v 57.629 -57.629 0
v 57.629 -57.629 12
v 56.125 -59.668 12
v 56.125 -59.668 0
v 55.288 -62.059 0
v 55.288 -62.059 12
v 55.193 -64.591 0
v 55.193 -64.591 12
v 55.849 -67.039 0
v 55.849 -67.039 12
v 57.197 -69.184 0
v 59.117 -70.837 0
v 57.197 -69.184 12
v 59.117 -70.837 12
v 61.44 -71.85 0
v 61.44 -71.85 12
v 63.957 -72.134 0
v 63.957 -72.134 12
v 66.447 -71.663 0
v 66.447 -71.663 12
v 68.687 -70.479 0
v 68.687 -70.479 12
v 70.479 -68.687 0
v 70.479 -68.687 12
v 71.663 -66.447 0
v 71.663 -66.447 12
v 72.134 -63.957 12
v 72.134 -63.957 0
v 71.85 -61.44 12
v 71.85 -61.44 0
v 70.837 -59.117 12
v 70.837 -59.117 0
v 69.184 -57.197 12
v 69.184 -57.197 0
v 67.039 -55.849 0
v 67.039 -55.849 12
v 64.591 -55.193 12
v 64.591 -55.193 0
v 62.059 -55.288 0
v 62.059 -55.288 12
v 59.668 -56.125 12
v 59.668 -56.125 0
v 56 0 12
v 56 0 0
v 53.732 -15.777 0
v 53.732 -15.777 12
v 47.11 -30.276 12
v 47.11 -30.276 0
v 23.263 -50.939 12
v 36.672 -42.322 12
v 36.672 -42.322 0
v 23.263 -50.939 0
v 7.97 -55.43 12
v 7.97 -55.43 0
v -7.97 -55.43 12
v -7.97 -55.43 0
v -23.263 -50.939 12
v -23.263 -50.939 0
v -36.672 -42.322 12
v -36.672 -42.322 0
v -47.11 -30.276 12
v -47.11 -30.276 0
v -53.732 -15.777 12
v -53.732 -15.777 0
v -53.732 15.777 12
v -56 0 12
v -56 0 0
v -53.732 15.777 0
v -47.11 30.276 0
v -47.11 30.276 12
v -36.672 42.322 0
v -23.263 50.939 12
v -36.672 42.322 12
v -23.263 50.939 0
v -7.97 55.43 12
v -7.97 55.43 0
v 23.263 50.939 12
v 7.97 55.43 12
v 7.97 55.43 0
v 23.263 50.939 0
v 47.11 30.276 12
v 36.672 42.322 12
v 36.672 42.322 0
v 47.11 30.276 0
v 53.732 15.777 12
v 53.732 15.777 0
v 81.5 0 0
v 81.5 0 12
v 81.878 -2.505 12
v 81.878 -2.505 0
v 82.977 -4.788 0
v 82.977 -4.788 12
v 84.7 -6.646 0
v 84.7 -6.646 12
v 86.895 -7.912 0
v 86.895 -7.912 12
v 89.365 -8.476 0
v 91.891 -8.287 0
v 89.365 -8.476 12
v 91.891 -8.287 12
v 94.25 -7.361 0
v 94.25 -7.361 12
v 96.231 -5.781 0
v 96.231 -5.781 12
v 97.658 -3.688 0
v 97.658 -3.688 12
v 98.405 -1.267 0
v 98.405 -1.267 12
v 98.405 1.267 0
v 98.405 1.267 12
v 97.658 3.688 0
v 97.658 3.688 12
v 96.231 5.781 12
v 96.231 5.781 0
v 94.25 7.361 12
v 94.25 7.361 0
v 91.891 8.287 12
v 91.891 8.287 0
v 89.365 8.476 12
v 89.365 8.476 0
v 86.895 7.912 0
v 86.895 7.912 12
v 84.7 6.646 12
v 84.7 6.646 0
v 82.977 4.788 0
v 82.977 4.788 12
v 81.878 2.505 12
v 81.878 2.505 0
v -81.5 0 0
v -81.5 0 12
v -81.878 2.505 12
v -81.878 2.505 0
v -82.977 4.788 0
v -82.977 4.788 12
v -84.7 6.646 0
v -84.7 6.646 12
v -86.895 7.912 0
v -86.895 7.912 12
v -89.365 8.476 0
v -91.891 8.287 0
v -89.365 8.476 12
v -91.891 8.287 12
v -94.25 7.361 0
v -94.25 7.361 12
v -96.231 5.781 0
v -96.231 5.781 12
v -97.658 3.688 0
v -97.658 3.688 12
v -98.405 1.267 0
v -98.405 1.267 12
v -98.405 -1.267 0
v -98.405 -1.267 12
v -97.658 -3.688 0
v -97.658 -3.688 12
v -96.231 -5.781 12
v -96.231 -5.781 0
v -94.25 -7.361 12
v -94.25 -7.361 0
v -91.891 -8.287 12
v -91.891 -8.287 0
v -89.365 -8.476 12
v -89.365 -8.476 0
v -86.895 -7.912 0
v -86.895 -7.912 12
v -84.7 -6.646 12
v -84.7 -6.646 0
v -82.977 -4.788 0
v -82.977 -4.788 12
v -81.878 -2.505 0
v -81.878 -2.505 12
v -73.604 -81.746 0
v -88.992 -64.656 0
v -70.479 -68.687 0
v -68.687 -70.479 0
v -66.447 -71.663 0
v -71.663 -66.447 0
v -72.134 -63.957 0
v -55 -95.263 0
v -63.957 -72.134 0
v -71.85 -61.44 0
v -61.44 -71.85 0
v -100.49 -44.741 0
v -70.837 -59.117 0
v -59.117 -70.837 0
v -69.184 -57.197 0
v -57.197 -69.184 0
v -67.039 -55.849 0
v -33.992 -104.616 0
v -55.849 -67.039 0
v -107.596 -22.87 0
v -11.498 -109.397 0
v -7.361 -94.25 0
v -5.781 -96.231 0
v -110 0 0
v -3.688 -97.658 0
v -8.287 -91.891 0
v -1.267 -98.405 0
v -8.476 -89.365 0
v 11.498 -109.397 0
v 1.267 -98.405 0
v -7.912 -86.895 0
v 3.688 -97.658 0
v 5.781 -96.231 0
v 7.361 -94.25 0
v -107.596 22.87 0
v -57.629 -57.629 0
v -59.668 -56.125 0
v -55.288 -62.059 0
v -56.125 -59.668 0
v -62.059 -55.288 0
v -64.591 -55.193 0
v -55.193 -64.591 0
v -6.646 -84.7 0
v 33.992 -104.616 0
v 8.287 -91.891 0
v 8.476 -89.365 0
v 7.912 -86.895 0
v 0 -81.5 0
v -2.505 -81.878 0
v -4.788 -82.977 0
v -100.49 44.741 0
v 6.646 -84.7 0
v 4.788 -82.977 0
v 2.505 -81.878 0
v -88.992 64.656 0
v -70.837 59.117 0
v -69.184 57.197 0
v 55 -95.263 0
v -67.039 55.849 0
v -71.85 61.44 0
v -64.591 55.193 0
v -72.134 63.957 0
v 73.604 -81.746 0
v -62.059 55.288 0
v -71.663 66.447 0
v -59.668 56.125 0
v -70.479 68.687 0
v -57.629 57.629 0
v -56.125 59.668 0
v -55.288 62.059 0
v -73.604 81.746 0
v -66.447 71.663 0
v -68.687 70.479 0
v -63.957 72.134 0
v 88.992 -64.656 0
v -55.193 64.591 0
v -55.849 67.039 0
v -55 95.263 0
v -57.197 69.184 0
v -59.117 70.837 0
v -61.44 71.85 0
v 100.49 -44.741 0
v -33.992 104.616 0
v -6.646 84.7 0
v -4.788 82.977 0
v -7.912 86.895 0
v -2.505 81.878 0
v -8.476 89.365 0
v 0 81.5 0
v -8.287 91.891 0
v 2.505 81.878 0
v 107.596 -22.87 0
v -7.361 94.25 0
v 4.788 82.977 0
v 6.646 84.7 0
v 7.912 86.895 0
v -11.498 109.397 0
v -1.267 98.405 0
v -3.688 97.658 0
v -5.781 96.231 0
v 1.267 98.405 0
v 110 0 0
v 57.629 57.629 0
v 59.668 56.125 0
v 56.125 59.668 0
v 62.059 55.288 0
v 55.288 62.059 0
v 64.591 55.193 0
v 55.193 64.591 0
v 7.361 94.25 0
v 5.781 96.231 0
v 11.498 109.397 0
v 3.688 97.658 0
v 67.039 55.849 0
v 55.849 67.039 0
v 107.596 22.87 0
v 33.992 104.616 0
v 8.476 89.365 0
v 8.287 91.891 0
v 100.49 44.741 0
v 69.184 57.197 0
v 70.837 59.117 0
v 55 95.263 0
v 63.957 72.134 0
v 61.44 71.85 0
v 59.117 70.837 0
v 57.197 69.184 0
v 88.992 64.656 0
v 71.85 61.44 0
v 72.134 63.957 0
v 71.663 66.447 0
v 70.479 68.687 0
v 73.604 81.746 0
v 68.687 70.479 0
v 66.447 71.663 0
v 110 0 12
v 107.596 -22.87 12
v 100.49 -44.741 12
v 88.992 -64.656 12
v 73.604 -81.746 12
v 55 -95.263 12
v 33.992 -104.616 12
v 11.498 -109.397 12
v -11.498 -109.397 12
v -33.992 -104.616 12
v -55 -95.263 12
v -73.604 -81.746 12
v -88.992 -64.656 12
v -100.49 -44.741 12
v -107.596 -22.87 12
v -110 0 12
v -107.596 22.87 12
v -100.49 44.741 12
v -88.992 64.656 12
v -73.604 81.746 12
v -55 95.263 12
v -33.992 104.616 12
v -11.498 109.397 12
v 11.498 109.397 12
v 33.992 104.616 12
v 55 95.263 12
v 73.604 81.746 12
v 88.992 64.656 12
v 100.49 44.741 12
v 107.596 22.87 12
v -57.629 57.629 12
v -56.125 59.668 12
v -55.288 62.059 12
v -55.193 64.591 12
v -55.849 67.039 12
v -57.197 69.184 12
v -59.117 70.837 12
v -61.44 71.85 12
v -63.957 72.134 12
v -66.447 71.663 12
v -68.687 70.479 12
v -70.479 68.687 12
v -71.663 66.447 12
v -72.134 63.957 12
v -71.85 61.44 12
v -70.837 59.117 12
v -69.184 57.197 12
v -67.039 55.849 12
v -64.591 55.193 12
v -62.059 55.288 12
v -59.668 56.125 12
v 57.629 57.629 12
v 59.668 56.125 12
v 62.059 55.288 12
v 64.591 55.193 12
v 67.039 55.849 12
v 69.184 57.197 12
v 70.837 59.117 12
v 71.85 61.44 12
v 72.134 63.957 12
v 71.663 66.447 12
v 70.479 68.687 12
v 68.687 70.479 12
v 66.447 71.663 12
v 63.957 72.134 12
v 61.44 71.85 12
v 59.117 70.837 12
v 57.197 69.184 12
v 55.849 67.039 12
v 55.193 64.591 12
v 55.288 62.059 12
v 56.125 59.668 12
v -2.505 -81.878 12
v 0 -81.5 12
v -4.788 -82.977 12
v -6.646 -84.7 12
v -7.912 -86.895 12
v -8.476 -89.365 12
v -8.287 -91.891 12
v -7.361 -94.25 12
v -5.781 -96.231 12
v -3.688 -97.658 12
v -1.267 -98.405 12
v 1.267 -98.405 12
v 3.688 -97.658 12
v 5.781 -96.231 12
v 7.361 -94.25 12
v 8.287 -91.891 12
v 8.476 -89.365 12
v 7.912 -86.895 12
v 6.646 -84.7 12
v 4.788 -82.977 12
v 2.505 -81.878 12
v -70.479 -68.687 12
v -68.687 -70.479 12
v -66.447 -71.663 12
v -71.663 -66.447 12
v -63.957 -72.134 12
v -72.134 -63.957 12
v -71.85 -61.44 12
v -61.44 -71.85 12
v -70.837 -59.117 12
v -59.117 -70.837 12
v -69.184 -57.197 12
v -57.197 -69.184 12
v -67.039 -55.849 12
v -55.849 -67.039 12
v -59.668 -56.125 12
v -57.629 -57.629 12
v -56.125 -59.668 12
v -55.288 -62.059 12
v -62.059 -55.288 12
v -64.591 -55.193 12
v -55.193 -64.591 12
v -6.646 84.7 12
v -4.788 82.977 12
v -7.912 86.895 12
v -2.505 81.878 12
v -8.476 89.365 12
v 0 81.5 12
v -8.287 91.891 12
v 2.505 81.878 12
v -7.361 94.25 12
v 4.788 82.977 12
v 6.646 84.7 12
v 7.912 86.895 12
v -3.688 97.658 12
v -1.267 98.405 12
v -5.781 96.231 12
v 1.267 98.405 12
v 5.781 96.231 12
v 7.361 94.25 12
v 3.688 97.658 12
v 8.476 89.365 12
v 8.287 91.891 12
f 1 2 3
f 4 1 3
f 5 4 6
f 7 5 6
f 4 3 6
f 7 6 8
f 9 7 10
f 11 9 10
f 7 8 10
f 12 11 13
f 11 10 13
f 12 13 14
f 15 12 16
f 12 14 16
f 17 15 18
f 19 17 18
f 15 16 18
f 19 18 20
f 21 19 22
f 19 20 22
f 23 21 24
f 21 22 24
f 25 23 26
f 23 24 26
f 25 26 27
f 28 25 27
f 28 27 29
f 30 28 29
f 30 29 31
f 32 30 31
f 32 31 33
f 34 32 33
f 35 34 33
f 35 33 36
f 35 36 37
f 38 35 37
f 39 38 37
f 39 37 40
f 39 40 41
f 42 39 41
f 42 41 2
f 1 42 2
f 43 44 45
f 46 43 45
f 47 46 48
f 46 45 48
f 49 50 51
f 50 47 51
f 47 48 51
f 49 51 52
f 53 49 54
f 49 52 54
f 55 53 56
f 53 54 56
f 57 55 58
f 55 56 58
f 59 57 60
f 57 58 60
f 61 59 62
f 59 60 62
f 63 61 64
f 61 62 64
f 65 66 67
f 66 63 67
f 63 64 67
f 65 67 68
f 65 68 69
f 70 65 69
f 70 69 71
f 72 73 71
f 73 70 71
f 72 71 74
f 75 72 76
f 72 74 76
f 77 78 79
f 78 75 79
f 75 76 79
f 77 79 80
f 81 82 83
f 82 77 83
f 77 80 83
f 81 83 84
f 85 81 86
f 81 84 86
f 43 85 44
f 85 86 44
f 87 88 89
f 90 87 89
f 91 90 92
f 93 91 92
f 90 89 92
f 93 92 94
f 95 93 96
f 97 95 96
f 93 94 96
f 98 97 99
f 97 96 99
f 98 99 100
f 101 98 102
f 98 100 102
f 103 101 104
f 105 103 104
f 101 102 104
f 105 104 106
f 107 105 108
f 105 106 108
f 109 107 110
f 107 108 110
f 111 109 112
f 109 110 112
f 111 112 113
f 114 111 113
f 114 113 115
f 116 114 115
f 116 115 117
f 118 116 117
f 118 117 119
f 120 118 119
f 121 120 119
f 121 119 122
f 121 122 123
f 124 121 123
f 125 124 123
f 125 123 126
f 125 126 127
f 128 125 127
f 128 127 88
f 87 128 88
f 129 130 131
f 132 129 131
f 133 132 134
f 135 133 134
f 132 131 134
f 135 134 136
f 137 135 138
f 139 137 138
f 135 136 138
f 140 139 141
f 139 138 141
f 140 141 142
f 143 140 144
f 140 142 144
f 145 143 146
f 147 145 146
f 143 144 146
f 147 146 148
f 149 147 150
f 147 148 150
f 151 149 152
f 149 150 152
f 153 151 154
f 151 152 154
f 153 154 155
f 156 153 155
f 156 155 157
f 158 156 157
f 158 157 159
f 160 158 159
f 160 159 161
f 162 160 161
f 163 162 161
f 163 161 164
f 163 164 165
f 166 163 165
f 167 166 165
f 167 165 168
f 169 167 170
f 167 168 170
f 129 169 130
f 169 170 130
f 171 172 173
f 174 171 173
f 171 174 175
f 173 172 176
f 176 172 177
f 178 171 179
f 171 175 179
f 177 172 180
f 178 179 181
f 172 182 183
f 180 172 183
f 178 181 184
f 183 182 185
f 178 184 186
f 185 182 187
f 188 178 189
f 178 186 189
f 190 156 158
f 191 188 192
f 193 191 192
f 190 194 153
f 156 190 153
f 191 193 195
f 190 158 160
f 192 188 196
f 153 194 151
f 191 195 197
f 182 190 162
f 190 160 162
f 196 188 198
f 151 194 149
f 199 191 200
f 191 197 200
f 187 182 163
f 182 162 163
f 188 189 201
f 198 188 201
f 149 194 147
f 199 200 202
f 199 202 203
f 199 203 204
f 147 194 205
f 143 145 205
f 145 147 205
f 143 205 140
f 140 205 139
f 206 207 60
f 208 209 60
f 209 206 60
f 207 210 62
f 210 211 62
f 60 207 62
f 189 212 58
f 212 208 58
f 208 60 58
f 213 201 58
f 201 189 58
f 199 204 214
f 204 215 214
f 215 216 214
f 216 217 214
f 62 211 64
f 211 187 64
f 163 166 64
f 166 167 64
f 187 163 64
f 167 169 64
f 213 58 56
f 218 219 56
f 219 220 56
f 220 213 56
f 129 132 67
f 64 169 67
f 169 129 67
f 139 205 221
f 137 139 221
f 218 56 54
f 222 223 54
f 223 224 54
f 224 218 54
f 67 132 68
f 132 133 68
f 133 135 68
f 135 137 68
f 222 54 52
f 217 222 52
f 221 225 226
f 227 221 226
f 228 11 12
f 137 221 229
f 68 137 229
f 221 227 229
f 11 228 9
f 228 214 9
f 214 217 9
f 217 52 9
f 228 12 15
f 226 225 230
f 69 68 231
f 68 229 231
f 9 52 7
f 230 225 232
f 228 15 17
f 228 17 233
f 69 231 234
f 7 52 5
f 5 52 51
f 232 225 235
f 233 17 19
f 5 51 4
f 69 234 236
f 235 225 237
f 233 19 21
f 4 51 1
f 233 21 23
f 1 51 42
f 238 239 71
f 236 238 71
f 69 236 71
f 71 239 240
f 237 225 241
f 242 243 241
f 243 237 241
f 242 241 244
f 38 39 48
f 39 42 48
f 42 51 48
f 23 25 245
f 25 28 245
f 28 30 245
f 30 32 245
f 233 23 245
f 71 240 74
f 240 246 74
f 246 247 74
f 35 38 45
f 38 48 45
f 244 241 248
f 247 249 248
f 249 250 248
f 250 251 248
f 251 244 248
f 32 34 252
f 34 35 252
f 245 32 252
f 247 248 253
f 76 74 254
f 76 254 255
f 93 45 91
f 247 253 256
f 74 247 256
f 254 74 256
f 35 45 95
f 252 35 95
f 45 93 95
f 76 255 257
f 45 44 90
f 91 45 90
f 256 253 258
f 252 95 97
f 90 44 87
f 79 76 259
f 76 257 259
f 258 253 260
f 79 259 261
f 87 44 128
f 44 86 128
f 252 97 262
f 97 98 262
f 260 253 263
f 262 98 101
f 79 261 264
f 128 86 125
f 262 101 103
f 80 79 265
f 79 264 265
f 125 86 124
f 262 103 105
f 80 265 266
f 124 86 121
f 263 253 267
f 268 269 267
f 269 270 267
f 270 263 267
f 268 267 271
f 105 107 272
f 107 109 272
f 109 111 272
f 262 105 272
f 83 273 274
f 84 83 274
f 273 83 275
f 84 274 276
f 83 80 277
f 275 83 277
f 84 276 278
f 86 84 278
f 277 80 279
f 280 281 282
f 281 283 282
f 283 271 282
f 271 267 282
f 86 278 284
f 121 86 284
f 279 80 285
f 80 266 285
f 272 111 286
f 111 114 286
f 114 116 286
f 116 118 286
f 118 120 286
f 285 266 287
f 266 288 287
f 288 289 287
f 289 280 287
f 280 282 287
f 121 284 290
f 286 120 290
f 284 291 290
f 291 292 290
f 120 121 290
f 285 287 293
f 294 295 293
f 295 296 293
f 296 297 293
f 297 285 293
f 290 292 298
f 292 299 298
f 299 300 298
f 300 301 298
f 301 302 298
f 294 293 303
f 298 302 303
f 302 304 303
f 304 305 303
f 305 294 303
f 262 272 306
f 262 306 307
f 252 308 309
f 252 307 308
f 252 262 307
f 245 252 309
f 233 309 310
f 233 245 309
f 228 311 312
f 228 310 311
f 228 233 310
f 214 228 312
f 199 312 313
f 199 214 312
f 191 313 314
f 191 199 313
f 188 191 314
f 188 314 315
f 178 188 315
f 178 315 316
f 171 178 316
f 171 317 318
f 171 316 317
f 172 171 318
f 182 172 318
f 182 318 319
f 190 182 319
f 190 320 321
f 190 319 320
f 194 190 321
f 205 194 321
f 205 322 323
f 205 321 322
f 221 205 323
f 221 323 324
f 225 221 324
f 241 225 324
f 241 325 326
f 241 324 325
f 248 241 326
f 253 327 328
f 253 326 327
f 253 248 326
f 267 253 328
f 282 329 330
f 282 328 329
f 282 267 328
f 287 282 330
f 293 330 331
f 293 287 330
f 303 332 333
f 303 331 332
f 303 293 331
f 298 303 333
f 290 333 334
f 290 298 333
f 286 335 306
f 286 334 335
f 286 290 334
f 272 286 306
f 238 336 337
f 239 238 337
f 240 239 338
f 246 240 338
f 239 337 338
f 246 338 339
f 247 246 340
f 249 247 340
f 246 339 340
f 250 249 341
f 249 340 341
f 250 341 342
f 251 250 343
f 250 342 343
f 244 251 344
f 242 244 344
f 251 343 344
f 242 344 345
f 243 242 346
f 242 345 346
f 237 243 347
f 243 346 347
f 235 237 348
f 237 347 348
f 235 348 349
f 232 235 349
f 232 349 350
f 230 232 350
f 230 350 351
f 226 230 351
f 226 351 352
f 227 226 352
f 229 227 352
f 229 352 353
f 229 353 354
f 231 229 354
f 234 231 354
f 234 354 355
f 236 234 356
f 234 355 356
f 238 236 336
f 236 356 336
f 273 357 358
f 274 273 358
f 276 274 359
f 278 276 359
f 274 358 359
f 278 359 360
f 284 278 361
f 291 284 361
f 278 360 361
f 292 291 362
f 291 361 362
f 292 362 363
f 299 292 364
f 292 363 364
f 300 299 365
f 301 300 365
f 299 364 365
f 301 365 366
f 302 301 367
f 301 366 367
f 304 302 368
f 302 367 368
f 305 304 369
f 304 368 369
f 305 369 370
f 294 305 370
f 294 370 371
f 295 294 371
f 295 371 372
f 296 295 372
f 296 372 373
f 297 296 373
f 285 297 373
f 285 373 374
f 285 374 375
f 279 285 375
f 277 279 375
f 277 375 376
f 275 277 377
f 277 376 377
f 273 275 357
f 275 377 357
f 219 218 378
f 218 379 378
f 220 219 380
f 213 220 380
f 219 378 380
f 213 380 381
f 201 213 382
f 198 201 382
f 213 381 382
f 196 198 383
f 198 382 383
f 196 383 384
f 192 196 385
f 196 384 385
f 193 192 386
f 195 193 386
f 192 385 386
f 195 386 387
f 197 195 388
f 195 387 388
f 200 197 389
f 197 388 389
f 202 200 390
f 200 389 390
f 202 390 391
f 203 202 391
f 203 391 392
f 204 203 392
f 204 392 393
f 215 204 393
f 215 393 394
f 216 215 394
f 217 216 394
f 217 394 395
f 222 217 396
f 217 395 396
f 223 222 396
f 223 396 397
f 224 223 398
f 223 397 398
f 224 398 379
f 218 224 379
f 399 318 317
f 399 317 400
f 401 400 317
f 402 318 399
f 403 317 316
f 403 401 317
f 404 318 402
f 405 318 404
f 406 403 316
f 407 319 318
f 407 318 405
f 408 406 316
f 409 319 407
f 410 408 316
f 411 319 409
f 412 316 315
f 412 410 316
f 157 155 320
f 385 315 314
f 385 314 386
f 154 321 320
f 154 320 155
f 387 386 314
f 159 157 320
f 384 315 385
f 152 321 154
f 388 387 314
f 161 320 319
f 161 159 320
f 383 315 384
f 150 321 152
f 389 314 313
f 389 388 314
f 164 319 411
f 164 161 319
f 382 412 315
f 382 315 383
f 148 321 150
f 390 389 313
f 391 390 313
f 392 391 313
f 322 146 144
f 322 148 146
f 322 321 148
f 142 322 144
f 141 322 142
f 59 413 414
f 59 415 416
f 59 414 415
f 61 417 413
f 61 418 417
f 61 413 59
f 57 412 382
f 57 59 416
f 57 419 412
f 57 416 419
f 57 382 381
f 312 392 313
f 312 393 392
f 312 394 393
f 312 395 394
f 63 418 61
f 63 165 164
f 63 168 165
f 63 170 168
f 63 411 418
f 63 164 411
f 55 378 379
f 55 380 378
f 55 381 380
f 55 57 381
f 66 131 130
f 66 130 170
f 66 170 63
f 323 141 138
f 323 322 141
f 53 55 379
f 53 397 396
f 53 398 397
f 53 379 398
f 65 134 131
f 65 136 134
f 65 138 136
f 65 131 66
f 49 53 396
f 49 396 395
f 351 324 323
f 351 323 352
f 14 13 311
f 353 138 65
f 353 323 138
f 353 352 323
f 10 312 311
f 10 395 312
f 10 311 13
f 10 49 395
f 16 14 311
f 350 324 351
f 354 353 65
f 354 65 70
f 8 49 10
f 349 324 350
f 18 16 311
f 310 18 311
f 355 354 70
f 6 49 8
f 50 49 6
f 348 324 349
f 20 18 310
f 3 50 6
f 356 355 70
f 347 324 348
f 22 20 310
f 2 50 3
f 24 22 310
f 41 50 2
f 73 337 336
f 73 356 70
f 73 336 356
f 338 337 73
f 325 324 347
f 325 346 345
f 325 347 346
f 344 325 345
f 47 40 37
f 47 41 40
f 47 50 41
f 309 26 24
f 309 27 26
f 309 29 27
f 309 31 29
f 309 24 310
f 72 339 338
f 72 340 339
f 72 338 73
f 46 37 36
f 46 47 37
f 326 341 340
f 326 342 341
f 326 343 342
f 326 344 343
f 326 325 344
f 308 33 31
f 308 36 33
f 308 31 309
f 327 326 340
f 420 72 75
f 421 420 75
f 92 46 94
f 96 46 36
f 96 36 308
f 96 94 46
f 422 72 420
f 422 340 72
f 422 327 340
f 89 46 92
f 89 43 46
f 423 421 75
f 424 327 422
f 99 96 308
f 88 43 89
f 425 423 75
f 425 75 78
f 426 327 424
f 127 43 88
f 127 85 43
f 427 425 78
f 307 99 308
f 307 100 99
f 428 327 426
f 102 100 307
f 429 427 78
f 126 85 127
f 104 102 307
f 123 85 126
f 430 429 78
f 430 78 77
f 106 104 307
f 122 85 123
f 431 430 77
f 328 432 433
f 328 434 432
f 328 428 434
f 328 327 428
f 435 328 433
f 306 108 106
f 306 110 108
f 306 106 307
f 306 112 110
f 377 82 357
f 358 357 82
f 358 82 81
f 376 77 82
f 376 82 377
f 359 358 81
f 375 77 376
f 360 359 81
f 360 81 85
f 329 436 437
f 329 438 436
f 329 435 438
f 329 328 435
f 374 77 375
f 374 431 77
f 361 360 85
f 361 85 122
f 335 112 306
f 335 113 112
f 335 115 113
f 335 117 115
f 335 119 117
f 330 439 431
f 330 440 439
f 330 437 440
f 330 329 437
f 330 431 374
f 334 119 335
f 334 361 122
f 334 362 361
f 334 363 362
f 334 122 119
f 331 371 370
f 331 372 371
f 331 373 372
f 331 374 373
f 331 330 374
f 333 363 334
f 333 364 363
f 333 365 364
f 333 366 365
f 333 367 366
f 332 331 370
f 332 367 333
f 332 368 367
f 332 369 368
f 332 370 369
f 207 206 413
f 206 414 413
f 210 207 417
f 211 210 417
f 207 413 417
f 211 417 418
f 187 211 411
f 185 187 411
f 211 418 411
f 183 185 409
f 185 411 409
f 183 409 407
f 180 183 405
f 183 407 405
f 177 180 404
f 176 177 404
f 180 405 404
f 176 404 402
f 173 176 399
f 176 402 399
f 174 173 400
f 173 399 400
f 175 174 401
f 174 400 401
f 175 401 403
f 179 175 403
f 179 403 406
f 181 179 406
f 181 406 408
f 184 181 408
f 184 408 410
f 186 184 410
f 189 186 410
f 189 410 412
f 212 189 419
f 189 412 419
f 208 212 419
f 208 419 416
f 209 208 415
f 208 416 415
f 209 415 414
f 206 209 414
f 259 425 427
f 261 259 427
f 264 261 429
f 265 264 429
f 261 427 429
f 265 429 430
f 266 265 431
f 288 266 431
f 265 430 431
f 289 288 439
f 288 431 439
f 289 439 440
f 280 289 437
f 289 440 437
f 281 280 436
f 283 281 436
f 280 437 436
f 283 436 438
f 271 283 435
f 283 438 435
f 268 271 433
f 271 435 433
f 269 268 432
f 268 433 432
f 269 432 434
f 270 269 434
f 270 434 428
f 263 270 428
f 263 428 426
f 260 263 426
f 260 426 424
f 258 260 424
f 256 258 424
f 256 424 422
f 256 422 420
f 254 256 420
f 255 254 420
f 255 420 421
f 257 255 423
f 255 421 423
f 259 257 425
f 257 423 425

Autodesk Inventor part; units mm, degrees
ref_plane "YZ Plane" through (0, 0, 0) normal (1, 0, 0) x (0, 1, 0)
ref_plane "XZ Plane" through (0, 0, 0) normal (0, 1, 0) x (-1, 0, 0)
ref_plane "XY Plane" through (0, 0, 0) normal (0, 0, 1) x (1, 0, 0)
sketch "Sketch2" plane through (0, 0, 0) normal (0, 0, 1) x (1, 0, 0)
  circle A0 centre (0, 0) radius 56
  circle A1 centre (0, 0) radius 110
  dimension "d25" = 112
  dimension "d27" = 220
extrude "Plate2" add sketch "Sketch2" along normal blind 12
sketch "Sketch3" plane through (0, 0, 12) normal (0, 0, 1) x (1, 0, 0)
  circle A0 centre (-90, 0) radius 8.5
  circle A1 centre (0, 0) radius 90 construction
  dimension "d28" = 180
  dimension "d15" = 17
extrude "Cut1" cut sketch "Sketch3" against normal blind 12
pattern_circular "Circular Pattern1" count 8 over 360 about axis through (0, 0, -10) along (0, 0, 1) of "Cut1"
equation "\"d17\" = Thickness"
equation "\"d14\" = Thickness"
equation "\"BendReliefWidth\" = Thickness"
equation "\"BendReliefDepth\" = 0.5 * Thickness"
equation "\"CornerReliefSize\" = 4 * Thickness"
equation "\"MinimumRemnant\" = 2 * Thickness"
equation "\"TransitionRadius\" = BendRadius"
equation "\"JacobiRadiusSize\" = BendRadius"
equation "\"GapSize\" = Thickness"
equation "\"Thickness\" = 12"
equation "\"BendRadius\" = 6"
properties part number "APN 1433 FDS flange DN100" material "Steel"
